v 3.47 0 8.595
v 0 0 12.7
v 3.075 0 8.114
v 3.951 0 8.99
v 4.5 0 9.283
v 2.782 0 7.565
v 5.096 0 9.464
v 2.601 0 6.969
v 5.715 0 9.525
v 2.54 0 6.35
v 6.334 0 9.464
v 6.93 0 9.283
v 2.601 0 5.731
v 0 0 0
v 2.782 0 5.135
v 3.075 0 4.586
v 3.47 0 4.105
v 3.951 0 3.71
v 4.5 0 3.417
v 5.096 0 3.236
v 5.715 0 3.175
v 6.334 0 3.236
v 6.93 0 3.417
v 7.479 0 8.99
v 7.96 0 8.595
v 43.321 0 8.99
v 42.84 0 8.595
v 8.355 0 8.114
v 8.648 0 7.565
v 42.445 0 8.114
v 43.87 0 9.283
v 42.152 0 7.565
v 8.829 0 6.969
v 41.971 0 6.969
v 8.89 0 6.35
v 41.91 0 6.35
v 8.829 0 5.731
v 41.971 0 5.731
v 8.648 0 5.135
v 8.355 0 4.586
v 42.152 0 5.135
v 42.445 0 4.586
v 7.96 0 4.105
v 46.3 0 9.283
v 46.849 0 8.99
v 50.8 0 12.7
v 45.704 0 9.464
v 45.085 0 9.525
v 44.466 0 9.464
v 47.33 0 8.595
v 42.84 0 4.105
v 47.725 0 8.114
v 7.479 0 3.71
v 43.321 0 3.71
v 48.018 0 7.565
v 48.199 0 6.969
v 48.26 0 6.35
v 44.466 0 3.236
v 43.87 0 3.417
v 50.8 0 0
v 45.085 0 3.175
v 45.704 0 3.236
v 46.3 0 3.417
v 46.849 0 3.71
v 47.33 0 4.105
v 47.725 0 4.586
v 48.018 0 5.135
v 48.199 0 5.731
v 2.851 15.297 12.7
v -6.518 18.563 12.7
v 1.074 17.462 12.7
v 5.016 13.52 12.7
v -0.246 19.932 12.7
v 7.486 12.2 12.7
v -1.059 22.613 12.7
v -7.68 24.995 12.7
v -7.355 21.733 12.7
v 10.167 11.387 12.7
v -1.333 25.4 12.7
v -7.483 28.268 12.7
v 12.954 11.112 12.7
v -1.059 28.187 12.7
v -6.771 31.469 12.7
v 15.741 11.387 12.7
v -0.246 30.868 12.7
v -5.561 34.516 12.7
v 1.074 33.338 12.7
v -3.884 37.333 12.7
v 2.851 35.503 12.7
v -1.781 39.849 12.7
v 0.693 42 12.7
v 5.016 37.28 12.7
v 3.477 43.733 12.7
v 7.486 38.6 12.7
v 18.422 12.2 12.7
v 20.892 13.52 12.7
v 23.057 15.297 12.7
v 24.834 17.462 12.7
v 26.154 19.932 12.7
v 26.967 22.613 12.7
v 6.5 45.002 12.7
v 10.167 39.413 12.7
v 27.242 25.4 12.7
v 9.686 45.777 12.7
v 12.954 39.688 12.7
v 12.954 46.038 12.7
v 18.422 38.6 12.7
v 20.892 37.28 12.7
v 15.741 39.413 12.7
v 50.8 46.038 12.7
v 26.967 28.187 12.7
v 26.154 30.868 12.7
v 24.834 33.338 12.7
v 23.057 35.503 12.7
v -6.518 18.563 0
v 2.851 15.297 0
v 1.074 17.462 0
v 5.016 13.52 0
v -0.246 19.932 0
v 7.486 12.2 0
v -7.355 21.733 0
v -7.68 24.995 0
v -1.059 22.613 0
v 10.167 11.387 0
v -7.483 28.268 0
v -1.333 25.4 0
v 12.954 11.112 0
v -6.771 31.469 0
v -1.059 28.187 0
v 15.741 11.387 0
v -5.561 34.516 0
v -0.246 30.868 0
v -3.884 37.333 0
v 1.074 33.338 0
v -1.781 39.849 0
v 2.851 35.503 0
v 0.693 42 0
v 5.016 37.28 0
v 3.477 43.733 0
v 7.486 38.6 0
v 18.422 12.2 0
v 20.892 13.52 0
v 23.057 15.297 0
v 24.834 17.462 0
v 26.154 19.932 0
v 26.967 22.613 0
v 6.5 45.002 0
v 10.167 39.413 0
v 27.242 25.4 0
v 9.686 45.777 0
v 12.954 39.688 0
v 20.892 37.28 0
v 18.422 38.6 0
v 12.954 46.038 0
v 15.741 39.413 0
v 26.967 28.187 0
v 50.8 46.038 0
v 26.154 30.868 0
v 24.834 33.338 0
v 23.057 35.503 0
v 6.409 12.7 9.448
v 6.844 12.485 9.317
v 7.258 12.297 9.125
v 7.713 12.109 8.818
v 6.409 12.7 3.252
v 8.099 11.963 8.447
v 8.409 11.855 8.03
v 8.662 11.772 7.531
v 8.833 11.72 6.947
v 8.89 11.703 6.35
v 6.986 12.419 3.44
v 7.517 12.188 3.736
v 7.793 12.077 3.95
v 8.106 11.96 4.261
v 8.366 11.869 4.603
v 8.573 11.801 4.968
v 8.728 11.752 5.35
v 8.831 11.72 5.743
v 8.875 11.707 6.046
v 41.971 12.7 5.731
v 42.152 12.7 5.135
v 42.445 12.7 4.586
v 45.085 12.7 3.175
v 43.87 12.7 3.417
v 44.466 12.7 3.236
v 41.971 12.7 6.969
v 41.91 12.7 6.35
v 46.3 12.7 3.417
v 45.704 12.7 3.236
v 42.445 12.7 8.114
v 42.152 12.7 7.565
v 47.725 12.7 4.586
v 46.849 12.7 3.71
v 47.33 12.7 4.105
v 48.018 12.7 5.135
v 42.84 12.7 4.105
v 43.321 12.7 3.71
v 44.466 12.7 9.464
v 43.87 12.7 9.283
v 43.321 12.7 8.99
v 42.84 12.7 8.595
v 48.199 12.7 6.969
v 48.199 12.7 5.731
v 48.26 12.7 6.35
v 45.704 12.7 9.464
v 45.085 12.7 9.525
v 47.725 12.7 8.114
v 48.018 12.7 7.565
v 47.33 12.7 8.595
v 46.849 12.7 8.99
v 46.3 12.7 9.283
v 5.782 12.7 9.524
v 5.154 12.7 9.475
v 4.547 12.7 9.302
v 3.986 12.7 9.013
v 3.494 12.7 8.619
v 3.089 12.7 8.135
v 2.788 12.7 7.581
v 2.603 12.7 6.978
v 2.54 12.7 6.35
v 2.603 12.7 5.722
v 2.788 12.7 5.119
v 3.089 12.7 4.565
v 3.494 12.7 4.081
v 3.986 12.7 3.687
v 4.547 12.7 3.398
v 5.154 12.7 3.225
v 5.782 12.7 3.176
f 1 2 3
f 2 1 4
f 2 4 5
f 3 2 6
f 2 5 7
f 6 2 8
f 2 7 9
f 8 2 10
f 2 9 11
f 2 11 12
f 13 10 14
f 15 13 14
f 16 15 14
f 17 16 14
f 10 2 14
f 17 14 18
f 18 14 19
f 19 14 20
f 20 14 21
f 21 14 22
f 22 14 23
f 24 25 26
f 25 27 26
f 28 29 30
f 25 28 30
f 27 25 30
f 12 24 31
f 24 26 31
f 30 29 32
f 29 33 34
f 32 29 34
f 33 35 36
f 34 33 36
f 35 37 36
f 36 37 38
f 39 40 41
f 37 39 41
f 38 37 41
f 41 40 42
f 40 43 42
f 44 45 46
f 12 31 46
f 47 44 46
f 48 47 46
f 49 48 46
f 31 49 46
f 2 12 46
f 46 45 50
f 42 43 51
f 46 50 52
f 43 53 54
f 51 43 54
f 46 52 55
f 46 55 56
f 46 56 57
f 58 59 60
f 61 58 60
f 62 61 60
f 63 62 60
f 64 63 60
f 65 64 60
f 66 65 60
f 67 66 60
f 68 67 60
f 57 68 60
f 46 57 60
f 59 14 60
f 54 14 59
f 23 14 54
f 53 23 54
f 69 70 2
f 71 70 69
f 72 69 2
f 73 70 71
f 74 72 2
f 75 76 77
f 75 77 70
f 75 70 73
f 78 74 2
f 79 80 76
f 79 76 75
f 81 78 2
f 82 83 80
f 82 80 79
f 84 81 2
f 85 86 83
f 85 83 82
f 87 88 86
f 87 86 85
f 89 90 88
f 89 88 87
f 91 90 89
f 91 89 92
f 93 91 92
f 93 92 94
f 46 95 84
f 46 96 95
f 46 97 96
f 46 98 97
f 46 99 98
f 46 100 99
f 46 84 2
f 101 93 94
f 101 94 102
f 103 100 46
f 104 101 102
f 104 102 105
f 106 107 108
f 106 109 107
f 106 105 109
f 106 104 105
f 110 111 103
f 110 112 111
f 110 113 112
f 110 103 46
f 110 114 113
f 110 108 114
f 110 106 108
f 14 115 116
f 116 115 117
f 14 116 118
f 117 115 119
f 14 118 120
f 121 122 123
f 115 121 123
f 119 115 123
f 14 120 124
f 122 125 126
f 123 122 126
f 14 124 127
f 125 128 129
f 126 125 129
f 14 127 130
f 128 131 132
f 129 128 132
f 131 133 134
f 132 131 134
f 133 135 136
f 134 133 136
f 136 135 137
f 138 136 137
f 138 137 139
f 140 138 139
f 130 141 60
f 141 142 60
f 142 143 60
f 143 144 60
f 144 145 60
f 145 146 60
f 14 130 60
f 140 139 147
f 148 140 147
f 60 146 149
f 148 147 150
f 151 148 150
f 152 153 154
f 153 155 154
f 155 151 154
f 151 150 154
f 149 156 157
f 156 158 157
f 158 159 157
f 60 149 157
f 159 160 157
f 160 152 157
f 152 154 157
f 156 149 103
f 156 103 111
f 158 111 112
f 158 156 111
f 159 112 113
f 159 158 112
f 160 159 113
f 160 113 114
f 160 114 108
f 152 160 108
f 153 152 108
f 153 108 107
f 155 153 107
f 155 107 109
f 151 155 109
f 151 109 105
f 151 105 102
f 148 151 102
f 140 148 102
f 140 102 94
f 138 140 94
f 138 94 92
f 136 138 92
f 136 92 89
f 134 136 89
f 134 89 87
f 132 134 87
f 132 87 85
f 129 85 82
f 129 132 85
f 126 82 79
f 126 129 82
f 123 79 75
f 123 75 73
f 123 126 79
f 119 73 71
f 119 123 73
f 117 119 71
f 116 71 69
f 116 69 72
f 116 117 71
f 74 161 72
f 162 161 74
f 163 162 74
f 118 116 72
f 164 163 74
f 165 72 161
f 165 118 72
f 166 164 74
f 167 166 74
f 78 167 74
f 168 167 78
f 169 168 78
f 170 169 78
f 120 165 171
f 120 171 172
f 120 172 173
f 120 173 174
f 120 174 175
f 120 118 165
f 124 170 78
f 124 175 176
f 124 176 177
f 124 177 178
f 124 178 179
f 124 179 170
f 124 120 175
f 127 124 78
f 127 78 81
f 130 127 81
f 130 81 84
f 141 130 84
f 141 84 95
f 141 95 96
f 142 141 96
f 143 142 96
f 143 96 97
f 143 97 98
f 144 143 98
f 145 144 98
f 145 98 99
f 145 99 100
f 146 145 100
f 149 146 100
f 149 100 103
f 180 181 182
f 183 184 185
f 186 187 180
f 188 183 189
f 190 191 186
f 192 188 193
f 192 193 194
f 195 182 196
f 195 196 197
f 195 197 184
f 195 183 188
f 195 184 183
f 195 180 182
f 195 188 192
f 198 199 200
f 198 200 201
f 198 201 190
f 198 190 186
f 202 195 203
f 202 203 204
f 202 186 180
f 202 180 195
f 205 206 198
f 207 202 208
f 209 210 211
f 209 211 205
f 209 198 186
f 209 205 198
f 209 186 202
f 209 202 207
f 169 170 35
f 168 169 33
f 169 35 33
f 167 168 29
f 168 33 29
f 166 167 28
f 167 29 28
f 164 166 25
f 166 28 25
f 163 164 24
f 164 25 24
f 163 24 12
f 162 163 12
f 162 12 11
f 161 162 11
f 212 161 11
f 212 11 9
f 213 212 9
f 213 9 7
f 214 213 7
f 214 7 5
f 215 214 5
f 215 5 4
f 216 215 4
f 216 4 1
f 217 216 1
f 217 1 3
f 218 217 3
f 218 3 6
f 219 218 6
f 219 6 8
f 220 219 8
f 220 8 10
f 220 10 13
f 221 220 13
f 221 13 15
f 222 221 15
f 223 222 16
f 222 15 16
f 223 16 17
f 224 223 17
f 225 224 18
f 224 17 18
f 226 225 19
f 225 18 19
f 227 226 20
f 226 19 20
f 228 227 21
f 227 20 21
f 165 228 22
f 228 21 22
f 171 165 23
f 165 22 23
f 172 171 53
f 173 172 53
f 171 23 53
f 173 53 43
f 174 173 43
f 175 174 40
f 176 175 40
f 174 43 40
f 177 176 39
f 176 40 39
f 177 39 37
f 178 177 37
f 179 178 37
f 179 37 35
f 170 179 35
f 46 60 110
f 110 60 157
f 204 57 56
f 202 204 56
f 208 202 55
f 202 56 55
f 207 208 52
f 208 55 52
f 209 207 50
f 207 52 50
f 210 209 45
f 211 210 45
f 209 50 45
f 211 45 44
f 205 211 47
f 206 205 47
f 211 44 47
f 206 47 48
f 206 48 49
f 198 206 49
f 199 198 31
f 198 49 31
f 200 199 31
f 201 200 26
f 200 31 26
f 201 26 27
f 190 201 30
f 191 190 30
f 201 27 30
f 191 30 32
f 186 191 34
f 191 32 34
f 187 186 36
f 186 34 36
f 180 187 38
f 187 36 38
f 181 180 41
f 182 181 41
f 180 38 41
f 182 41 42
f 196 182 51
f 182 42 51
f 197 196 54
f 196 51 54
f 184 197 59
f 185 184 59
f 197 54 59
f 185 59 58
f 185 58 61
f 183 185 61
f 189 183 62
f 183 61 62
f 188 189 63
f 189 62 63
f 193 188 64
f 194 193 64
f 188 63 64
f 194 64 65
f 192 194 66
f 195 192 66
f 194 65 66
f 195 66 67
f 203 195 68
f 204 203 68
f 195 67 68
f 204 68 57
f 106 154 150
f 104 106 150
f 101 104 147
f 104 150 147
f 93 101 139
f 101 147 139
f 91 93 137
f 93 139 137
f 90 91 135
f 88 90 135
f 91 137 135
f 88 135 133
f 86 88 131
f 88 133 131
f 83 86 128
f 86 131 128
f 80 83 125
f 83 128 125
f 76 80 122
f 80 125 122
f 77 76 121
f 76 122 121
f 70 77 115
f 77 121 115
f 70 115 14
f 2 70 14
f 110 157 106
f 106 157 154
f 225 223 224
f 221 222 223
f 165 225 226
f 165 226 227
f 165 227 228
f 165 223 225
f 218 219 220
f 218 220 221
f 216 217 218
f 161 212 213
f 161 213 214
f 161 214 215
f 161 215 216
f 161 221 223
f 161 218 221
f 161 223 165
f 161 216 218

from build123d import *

# Parameters (mm, degrees)
SKETCH1_R           = 20.6375
SKETCH1_R_2         = 14.2875
BOSS_EXTRUDE2_DEPTH = 12.7
SKETCH2_R           = 3.175
CUT_EXTRUDE1_DEPTH  = 12.7


with BuildPart() as part:
    # Sketch1 → Boss-Extrude2 (new body)
    with BuildSketch(Plane.XY):
        with BuildLine():
            Line((-6.517989108, 18.562745695), (0, 0))
            Line((0, 0), (50.8, 0))
            Line((50.8, 0), (50.8, 46.0375))
            Line((50.8, 46.0375), (12.954, 46.0375))
            ThreePointArc((12.954, 46.0375), (27.546916197, 39.992916197), (33.5915, 25.4))
            ThreePointArc((33.5915, 25.4), (16.421941106, 5.055964247), (-6.517989108, 18.562745695))
        make_face()
        with Locations((12.954, 25.4)):
            Circle(SKETCH1_R)
        with Locations((12.954, 25.4)):
            Circle(SKETCH1_R_2, mode=Mode.SUBTRACT)
    extrude(amount=BOSS_EXTRUDE2_DEPTH)

    # Sketch2 → Cut-Extrude1 (cut)
    with BuildSketch(Plane.XZ):
        with Locations((45.085, 6.35)):
            Circle(SKETCH2_R)
        with Locations((5.715, 6.35)):
            Circle(SKETCH2_R)
    extrude(amount=-CUT_EXTRUDE1_DEPTH, mode=Mode.SUBTRACT)


solid = part.part
